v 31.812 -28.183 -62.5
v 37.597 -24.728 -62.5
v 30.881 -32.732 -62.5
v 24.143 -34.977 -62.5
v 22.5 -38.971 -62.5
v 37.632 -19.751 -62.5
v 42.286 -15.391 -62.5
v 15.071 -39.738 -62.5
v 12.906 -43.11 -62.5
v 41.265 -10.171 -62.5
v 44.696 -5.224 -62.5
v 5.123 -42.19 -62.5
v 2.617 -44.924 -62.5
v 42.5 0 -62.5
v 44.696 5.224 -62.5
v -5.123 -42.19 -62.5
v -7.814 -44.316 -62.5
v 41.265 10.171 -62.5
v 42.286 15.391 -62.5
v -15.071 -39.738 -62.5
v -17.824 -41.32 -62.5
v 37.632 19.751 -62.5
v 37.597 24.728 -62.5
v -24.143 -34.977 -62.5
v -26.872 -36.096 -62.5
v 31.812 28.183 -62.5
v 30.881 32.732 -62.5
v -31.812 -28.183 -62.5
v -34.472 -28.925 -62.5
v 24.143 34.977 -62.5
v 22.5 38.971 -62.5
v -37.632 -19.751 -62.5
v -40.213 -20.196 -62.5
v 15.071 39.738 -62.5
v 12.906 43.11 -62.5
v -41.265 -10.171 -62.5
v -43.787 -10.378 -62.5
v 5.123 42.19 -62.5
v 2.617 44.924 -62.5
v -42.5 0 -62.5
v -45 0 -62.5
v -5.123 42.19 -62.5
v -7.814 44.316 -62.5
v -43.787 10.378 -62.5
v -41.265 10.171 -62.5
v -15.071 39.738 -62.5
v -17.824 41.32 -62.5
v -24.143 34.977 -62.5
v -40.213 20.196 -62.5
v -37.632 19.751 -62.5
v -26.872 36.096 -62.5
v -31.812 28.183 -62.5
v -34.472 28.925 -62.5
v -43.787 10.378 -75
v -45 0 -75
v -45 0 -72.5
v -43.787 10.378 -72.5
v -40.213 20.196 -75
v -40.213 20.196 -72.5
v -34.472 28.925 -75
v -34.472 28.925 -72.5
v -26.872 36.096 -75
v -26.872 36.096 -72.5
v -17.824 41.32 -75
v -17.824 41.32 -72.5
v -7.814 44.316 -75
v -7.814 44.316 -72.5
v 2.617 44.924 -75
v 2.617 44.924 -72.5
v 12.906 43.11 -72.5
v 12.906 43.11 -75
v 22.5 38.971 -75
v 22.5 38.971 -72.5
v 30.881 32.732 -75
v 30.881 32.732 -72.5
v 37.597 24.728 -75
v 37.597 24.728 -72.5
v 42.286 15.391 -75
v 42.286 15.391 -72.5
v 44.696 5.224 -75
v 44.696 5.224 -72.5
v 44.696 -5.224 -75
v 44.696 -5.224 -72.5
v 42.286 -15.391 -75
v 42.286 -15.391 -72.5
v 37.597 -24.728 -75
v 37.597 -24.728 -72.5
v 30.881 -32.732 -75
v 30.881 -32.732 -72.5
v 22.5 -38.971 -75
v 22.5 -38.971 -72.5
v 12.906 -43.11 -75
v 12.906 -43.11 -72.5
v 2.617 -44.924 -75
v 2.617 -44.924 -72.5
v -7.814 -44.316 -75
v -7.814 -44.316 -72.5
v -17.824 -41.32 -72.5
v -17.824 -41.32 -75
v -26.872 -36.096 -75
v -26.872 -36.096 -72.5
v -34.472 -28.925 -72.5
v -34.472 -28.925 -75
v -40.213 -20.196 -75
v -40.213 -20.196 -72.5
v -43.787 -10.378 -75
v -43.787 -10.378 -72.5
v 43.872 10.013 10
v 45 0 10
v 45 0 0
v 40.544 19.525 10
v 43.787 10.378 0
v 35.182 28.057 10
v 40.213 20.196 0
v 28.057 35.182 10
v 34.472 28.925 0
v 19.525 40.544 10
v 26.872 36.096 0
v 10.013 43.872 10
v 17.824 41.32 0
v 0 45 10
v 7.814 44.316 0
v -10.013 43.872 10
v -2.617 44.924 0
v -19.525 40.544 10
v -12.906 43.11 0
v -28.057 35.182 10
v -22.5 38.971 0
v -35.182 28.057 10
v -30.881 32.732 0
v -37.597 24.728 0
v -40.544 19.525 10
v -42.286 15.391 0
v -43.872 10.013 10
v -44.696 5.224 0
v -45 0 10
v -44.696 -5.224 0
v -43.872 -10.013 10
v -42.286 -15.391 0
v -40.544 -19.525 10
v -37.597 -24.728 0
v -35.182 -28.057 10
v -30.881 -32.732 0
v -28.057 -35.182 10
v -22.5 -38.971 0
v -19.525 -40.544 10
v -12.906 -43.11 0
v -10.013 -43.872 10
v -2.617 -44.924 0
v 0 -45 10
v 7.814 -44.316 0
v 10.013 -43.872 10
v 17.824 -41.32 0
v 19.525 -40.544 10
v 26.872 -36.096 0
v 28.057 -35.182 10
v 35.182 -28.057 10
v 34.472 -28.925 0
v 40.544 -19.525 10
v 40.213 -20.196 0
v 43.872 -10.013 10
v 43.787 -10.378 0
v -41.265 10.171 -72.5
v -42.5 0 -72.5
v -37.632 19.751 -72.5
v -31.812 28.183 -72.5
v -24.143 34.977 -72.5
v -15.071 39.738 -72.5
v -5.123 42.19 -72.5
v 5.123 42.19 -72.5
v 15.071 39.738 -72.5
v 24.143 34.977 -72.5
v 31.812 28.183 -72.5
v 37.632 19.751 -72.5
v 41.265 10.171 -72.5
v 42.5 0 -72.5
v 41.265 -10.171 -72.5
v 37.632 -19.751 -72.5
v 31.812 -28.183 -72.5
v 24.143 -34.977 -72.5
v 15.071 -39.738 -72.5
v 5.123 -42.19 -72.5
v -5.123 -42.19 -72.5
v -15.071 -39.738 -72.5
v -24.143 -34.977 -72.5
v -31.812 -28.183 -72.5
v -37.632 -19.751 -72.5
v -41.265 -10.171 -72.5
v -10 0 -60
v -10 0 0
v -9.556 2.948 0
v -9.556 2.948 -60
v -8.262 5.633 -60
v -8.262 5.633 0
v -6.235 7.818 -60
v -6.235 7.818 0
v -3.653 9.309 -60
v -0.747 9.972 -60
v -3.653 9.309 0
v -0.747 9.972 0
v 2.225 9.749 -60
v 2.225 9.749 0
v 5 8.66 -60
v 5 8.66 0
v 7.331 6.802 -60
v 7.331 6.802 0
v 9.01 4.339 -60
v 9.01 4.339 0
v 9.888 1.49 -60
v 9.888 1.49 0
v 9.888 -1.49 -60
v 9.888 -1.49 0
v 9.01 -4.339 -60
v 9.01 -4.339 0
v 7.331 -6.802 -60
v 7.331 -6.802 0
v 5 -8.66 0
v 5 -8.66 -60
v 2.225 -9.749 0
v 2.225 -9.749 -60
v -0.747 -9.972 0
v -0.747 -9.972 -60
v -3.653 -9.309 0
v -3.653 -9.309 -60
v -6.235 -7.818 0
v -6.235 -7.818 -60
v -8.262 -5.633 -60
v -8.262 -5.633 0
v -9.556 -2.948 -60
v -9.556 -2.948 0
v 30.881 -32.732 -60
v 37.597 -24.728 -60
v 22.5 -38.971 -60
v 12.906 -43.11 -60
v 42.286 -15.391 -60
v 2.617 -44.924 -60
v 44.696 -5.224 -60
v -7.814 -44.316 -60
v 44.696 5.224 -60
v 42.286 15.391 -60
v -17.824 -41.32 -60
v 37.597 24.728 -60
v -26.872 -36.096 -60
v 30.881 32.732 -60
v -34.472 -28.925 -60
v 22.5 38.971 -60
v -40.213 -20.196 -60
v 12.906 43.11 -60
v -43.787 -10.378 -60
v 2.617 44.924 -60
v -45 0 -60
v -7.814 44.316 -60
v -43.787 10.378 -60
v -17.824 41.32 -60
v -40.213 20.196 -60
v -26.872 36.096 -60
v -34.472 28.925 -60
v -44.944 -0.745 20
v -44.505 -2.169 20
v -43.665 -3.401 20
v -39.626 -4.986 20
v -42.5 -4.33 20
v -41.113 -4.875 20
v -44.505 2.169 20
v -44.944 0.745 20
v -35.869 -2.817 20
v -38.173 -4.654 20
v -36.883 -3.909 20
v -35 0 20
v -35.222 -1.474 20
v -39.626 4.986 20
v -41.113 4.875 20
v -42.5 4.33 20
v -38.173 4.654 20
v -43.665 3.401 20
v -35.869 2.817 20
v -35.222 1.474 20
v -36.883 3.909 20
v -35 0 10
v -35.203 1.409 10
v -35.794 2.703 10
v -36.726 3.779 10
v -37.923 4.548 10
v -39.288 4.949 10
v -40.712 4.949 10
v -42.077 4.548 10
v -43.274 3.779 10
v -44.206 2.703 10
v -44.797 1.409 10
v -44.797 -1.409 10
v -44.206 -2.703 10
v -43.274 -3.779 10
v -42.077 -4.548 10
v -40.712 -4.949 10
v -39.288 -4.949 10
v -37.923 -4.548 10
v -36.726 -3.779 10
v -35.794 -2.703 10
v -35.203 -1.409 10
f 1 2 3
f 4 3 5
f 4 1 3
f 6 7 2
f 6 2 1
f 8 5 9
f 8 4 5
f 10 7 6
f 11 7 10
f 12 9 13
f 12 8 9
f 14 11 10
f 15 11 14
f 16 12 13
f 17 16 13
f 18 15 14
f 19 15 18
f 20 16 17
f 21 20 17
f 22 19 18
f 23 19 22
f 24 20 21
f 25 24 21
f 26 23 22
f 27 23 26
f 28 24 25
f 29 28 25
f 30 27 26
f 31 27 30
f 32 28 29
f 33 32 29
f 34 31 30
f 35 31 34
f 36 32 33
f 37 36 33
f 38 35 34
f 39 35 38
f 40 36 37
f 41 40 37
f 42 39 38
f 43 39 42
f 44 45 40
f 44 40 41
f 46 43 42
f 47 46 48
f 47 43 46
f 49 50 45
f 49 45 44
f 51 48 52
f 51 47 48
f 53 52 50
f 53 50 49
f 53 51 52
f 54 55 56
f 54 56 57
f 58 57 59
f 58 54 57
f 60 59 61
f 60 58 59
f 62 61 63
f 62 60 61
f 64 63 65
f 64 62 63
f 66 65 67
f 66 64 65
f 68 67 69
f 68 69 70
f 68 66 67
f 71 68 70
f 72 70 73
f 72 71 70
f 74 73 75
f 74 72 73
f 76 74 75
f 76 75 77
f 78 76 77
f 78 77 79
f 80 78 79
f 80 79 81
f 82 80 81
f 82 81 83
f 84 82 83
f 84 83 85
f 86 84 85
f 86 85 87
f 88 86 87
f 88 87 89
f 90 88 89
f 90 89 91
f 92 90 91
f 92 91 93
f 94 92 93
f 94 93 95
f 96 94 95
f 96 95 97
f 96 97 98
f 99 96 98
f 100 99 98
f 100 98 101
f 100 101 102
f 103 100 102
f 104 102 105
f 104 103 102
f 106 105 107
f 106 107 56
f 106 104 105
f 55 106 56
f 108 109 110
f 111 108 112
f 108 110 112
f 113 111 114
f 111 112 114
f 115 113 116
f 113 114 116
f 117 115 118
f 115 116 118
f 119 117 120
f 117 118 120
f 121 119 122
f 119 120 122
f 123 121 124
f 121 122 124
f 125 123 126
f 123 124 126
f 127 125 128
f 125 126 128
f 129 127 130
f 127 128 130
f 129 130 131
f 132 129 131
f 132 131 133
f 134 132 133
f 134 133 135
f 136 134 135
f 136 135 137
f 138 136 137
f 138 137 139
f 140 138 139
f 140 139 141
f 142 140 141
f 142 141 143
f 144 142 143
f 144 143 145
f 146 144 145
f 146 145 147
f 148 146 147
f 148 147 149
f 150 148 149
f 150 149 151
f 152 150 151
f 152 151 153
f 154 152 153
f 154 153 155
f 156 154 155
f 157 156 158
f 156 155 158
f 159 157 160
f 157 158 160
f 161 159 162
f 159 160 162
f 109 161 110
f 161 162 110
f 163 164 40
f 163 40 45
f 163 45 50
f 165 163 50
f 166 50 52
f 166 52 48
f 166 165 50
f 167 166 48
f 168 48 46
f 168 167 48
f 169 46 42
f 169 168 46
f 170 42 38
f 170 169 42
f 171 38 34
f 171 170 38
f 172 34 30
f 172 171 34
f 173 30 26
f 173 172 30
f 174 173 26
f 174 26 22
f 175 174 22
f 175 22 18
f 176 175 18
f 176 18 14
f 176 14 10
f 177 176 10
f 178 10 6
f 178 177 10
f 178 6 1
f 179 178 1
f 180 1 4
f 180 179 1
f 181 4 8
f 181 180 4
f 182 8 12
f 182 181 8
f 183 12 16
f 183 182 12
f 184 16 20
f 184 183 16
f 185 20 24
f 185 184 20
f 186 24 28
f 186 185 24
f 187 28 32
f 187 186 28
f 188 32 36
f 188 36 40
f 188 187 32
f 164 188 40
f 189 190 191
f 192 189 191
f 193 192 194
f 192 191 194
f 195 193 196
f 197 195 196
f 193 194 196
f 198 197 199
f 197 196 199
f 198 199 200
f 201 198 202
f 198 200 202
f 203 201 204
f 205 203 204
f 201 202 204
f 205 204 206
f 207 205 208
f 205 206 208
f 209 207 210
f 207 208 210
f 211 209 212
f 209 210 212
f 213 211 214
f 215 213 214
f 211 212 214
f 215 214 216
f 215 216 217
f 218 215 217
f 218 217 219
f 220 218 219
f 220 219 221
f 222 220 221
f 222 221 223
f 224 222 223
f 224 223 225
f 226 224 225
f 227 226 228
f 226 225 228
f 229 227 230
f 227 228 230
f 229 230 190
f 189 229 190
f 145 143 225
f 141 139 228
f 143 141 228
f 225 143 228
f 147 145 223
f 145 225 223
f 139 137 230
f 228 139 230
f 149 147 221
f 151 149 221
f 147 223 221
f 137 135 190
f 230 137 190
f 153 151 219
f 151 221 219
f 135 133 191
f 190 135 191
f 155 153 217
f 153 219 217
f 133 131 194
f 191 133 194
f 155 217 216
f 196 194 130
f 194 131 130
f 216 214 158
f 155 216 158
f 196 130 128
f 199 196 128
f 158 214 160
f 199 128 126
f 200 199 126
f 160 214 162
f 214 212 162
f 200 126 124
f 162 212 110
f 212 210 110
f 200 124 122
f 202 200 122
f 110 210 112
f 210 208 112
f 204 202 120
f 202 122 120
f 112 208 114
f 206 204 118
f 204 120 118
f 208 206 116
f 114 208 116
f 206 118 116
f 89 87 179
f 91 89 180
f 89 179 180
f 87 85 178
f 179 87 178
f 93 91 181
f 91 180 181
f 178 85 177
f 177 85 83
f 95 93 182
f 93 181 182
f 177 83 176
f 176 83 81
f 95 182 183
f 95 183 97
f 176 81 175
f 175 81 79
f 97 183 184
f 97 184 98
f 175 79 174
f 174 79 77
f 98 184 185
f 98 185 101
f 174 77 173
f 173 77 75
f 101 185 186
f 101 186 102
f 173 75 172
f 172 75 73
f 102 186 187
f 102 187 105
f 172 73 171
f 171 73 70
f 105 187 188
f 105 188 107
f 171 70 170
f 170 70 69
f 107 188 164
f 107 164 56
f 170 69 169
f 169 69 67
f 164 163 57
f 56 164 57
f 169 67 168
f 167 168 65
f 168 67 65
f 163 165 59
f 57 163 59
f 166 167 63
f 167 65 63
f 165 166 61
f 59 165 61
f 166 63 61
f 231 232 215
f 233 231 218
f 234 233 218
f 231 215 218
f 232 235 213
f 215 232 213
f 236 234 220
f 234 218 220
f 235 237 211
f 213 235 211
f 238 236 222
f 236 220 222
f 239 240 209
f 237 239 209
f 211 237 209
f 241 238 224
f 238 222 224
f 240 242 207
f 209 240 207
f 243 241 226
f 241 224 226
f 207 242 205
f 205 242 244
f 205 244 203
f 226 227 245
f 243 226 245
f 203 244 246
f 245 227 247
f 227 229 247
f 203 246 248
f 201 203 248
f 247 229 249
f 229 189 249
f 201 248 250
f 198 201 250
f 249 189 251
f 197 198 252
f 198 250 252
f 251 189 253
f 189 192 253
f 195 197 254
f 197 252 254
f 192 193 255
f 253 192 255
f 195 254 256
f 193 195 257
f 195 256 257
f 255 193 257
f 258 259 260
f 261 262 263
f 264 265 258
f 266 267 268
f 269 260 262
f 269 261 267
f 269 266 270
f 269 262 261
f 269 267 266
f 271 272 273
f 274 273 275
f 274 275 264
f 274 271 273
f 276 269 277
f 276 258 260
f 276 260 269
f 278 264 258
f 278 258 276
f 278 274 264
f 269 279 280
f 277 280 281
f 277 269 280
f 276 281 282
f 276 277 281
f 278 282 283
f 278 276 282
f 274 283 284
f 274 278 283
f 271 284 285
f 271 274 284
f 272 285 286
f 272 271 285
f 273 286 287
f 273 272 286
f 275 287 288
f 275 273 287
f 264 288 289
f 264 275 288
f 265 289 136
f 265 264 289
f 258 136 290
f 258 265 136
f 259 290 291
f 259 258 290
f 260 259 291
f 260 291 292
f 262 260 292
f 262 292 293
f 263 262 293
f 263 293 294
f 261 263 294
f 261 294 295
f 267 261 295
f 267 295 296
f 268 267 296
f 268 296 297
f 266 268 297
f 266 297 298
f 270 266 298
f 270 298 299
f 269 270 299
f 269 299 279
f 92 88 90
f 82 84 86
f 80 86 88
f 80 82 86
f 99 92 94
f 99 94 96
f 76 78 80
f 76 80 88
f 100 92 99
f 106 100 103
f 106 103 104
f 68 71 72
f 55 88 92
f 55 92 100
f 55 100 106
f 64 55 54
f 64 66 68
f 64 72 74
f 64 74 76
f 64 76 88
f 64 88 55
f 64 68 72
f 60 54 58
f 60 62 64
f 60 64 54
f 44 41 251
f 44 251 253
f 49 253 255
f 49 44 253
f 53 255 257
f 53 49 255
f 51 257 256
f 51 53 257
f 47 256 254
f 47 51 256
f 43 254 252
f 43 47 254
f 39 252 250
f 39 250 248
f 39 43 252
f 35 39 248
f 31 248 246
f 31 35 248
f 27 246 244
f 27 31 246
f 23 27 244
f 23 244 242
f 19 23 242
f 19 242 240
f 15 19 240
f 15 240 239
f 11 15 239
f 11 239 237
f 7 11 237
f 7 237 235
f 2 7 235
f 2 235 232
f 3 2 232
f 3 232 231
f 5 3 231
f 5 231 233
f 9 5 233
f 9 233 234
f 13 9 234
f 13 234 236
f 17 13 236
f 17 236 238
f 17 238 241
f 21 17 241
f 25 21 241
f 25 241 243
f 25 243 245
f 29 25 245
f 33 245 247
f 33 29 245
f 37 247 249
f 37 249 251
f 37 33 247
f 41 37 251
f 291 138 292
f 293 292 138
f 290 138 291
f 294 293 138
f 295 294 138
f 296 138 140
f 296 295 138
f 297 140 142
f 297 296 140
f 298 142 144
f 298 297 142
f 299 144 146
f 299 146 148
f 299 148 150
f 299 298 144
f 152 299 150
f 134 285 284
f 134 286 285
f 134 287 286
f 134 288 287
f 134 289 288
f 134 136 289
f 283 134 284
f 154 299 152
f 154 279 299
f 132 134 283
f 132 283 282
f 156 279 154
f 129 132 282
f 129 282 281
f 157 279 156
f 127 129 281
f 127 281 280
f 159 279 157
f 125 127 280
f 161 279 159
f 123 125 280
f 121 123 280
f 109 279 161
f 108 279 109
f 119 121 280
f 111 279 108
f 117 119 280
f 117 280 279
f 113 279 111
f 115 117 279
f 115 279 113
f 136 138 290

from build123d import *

# Parameters (mm, degrees)
SKETCH1_R           = 45
BOSS_EXTRUDE1_DEPTH = 10
SKETCH2_R           = 5
BOSS_EXTRUDE2_DEPTH = 10
SKETCH3_R           = 10
BOSS_EXTRUDE3_DEPTH = 60
BOSS_EXTRUDE4_START = 15
SKETCH4_R           = 45
BOSS_EXTRUDE4_DEPTH = 15
CUT_EXTRUDE1_START  = -2.5
SKETCH5_R           = 45
SKETCH5_R_2         = 42.5
CUT_EXTRUDE1_DEPTH  = 10


with BuildPart() as part:
    # Sketch1 → Boss-Extrude1 (new body)
    with BuildSketch(Plane.XY):
        Circle(SKETCH1_R)
    extrude(amount=BOSS_EXTRUDE1_DEPTH)

    # Sketch2 → Boss-Extrude2 (add)
    with BuildSketch(Plane.XY.offset(20)):
        with Locations((-40, 0)):
            Circle(SKETCH2_R)
    extrude(amount=-BOSS_EXTRUDE2_DEPTH)

    # Sketch3 → Boss-Extrude3 (add)
    with BuildSketch(Plane(origin=(0, 0, 0), x_dir=(-1, 0, 0), z_dir=(0, 0, -1))):
        Circle(SKETCH3_R)
    extrude(amount=BOSS_EXTRUDE3_DEPTH)

    # Sketch4 → Boss-Extrude4 (add)
    with BuildSketch(Plane(origin=(0, 0, -60), x_dir=(-1, 0, 0), z_dir=(0, 0, -1)).offset(BOSS_EXTRUDE4_START)):
        Circle(SKETCH4_R)
    extrude(amount=-BOSS_EXTRUDE4_DEPTH)

    # Sketch5 → Cut-Extrude1 (cut)
    with BuildSketch(Plane(origin=(0, 0, -75), x_dir=(-1, 0, 0), z_dir=(0, 0, -1)).offset(CUT_EXTRUDE1_START)):
        Circle(SKETCH5_R)
        Circle(SKETCH5_R_2, mode=Mode.SUBTRACT)
    extrude(amount=-CUT_EXTRUDE1_DEPTH, mode=Mode.SUBTRACT)


solid = part.part
